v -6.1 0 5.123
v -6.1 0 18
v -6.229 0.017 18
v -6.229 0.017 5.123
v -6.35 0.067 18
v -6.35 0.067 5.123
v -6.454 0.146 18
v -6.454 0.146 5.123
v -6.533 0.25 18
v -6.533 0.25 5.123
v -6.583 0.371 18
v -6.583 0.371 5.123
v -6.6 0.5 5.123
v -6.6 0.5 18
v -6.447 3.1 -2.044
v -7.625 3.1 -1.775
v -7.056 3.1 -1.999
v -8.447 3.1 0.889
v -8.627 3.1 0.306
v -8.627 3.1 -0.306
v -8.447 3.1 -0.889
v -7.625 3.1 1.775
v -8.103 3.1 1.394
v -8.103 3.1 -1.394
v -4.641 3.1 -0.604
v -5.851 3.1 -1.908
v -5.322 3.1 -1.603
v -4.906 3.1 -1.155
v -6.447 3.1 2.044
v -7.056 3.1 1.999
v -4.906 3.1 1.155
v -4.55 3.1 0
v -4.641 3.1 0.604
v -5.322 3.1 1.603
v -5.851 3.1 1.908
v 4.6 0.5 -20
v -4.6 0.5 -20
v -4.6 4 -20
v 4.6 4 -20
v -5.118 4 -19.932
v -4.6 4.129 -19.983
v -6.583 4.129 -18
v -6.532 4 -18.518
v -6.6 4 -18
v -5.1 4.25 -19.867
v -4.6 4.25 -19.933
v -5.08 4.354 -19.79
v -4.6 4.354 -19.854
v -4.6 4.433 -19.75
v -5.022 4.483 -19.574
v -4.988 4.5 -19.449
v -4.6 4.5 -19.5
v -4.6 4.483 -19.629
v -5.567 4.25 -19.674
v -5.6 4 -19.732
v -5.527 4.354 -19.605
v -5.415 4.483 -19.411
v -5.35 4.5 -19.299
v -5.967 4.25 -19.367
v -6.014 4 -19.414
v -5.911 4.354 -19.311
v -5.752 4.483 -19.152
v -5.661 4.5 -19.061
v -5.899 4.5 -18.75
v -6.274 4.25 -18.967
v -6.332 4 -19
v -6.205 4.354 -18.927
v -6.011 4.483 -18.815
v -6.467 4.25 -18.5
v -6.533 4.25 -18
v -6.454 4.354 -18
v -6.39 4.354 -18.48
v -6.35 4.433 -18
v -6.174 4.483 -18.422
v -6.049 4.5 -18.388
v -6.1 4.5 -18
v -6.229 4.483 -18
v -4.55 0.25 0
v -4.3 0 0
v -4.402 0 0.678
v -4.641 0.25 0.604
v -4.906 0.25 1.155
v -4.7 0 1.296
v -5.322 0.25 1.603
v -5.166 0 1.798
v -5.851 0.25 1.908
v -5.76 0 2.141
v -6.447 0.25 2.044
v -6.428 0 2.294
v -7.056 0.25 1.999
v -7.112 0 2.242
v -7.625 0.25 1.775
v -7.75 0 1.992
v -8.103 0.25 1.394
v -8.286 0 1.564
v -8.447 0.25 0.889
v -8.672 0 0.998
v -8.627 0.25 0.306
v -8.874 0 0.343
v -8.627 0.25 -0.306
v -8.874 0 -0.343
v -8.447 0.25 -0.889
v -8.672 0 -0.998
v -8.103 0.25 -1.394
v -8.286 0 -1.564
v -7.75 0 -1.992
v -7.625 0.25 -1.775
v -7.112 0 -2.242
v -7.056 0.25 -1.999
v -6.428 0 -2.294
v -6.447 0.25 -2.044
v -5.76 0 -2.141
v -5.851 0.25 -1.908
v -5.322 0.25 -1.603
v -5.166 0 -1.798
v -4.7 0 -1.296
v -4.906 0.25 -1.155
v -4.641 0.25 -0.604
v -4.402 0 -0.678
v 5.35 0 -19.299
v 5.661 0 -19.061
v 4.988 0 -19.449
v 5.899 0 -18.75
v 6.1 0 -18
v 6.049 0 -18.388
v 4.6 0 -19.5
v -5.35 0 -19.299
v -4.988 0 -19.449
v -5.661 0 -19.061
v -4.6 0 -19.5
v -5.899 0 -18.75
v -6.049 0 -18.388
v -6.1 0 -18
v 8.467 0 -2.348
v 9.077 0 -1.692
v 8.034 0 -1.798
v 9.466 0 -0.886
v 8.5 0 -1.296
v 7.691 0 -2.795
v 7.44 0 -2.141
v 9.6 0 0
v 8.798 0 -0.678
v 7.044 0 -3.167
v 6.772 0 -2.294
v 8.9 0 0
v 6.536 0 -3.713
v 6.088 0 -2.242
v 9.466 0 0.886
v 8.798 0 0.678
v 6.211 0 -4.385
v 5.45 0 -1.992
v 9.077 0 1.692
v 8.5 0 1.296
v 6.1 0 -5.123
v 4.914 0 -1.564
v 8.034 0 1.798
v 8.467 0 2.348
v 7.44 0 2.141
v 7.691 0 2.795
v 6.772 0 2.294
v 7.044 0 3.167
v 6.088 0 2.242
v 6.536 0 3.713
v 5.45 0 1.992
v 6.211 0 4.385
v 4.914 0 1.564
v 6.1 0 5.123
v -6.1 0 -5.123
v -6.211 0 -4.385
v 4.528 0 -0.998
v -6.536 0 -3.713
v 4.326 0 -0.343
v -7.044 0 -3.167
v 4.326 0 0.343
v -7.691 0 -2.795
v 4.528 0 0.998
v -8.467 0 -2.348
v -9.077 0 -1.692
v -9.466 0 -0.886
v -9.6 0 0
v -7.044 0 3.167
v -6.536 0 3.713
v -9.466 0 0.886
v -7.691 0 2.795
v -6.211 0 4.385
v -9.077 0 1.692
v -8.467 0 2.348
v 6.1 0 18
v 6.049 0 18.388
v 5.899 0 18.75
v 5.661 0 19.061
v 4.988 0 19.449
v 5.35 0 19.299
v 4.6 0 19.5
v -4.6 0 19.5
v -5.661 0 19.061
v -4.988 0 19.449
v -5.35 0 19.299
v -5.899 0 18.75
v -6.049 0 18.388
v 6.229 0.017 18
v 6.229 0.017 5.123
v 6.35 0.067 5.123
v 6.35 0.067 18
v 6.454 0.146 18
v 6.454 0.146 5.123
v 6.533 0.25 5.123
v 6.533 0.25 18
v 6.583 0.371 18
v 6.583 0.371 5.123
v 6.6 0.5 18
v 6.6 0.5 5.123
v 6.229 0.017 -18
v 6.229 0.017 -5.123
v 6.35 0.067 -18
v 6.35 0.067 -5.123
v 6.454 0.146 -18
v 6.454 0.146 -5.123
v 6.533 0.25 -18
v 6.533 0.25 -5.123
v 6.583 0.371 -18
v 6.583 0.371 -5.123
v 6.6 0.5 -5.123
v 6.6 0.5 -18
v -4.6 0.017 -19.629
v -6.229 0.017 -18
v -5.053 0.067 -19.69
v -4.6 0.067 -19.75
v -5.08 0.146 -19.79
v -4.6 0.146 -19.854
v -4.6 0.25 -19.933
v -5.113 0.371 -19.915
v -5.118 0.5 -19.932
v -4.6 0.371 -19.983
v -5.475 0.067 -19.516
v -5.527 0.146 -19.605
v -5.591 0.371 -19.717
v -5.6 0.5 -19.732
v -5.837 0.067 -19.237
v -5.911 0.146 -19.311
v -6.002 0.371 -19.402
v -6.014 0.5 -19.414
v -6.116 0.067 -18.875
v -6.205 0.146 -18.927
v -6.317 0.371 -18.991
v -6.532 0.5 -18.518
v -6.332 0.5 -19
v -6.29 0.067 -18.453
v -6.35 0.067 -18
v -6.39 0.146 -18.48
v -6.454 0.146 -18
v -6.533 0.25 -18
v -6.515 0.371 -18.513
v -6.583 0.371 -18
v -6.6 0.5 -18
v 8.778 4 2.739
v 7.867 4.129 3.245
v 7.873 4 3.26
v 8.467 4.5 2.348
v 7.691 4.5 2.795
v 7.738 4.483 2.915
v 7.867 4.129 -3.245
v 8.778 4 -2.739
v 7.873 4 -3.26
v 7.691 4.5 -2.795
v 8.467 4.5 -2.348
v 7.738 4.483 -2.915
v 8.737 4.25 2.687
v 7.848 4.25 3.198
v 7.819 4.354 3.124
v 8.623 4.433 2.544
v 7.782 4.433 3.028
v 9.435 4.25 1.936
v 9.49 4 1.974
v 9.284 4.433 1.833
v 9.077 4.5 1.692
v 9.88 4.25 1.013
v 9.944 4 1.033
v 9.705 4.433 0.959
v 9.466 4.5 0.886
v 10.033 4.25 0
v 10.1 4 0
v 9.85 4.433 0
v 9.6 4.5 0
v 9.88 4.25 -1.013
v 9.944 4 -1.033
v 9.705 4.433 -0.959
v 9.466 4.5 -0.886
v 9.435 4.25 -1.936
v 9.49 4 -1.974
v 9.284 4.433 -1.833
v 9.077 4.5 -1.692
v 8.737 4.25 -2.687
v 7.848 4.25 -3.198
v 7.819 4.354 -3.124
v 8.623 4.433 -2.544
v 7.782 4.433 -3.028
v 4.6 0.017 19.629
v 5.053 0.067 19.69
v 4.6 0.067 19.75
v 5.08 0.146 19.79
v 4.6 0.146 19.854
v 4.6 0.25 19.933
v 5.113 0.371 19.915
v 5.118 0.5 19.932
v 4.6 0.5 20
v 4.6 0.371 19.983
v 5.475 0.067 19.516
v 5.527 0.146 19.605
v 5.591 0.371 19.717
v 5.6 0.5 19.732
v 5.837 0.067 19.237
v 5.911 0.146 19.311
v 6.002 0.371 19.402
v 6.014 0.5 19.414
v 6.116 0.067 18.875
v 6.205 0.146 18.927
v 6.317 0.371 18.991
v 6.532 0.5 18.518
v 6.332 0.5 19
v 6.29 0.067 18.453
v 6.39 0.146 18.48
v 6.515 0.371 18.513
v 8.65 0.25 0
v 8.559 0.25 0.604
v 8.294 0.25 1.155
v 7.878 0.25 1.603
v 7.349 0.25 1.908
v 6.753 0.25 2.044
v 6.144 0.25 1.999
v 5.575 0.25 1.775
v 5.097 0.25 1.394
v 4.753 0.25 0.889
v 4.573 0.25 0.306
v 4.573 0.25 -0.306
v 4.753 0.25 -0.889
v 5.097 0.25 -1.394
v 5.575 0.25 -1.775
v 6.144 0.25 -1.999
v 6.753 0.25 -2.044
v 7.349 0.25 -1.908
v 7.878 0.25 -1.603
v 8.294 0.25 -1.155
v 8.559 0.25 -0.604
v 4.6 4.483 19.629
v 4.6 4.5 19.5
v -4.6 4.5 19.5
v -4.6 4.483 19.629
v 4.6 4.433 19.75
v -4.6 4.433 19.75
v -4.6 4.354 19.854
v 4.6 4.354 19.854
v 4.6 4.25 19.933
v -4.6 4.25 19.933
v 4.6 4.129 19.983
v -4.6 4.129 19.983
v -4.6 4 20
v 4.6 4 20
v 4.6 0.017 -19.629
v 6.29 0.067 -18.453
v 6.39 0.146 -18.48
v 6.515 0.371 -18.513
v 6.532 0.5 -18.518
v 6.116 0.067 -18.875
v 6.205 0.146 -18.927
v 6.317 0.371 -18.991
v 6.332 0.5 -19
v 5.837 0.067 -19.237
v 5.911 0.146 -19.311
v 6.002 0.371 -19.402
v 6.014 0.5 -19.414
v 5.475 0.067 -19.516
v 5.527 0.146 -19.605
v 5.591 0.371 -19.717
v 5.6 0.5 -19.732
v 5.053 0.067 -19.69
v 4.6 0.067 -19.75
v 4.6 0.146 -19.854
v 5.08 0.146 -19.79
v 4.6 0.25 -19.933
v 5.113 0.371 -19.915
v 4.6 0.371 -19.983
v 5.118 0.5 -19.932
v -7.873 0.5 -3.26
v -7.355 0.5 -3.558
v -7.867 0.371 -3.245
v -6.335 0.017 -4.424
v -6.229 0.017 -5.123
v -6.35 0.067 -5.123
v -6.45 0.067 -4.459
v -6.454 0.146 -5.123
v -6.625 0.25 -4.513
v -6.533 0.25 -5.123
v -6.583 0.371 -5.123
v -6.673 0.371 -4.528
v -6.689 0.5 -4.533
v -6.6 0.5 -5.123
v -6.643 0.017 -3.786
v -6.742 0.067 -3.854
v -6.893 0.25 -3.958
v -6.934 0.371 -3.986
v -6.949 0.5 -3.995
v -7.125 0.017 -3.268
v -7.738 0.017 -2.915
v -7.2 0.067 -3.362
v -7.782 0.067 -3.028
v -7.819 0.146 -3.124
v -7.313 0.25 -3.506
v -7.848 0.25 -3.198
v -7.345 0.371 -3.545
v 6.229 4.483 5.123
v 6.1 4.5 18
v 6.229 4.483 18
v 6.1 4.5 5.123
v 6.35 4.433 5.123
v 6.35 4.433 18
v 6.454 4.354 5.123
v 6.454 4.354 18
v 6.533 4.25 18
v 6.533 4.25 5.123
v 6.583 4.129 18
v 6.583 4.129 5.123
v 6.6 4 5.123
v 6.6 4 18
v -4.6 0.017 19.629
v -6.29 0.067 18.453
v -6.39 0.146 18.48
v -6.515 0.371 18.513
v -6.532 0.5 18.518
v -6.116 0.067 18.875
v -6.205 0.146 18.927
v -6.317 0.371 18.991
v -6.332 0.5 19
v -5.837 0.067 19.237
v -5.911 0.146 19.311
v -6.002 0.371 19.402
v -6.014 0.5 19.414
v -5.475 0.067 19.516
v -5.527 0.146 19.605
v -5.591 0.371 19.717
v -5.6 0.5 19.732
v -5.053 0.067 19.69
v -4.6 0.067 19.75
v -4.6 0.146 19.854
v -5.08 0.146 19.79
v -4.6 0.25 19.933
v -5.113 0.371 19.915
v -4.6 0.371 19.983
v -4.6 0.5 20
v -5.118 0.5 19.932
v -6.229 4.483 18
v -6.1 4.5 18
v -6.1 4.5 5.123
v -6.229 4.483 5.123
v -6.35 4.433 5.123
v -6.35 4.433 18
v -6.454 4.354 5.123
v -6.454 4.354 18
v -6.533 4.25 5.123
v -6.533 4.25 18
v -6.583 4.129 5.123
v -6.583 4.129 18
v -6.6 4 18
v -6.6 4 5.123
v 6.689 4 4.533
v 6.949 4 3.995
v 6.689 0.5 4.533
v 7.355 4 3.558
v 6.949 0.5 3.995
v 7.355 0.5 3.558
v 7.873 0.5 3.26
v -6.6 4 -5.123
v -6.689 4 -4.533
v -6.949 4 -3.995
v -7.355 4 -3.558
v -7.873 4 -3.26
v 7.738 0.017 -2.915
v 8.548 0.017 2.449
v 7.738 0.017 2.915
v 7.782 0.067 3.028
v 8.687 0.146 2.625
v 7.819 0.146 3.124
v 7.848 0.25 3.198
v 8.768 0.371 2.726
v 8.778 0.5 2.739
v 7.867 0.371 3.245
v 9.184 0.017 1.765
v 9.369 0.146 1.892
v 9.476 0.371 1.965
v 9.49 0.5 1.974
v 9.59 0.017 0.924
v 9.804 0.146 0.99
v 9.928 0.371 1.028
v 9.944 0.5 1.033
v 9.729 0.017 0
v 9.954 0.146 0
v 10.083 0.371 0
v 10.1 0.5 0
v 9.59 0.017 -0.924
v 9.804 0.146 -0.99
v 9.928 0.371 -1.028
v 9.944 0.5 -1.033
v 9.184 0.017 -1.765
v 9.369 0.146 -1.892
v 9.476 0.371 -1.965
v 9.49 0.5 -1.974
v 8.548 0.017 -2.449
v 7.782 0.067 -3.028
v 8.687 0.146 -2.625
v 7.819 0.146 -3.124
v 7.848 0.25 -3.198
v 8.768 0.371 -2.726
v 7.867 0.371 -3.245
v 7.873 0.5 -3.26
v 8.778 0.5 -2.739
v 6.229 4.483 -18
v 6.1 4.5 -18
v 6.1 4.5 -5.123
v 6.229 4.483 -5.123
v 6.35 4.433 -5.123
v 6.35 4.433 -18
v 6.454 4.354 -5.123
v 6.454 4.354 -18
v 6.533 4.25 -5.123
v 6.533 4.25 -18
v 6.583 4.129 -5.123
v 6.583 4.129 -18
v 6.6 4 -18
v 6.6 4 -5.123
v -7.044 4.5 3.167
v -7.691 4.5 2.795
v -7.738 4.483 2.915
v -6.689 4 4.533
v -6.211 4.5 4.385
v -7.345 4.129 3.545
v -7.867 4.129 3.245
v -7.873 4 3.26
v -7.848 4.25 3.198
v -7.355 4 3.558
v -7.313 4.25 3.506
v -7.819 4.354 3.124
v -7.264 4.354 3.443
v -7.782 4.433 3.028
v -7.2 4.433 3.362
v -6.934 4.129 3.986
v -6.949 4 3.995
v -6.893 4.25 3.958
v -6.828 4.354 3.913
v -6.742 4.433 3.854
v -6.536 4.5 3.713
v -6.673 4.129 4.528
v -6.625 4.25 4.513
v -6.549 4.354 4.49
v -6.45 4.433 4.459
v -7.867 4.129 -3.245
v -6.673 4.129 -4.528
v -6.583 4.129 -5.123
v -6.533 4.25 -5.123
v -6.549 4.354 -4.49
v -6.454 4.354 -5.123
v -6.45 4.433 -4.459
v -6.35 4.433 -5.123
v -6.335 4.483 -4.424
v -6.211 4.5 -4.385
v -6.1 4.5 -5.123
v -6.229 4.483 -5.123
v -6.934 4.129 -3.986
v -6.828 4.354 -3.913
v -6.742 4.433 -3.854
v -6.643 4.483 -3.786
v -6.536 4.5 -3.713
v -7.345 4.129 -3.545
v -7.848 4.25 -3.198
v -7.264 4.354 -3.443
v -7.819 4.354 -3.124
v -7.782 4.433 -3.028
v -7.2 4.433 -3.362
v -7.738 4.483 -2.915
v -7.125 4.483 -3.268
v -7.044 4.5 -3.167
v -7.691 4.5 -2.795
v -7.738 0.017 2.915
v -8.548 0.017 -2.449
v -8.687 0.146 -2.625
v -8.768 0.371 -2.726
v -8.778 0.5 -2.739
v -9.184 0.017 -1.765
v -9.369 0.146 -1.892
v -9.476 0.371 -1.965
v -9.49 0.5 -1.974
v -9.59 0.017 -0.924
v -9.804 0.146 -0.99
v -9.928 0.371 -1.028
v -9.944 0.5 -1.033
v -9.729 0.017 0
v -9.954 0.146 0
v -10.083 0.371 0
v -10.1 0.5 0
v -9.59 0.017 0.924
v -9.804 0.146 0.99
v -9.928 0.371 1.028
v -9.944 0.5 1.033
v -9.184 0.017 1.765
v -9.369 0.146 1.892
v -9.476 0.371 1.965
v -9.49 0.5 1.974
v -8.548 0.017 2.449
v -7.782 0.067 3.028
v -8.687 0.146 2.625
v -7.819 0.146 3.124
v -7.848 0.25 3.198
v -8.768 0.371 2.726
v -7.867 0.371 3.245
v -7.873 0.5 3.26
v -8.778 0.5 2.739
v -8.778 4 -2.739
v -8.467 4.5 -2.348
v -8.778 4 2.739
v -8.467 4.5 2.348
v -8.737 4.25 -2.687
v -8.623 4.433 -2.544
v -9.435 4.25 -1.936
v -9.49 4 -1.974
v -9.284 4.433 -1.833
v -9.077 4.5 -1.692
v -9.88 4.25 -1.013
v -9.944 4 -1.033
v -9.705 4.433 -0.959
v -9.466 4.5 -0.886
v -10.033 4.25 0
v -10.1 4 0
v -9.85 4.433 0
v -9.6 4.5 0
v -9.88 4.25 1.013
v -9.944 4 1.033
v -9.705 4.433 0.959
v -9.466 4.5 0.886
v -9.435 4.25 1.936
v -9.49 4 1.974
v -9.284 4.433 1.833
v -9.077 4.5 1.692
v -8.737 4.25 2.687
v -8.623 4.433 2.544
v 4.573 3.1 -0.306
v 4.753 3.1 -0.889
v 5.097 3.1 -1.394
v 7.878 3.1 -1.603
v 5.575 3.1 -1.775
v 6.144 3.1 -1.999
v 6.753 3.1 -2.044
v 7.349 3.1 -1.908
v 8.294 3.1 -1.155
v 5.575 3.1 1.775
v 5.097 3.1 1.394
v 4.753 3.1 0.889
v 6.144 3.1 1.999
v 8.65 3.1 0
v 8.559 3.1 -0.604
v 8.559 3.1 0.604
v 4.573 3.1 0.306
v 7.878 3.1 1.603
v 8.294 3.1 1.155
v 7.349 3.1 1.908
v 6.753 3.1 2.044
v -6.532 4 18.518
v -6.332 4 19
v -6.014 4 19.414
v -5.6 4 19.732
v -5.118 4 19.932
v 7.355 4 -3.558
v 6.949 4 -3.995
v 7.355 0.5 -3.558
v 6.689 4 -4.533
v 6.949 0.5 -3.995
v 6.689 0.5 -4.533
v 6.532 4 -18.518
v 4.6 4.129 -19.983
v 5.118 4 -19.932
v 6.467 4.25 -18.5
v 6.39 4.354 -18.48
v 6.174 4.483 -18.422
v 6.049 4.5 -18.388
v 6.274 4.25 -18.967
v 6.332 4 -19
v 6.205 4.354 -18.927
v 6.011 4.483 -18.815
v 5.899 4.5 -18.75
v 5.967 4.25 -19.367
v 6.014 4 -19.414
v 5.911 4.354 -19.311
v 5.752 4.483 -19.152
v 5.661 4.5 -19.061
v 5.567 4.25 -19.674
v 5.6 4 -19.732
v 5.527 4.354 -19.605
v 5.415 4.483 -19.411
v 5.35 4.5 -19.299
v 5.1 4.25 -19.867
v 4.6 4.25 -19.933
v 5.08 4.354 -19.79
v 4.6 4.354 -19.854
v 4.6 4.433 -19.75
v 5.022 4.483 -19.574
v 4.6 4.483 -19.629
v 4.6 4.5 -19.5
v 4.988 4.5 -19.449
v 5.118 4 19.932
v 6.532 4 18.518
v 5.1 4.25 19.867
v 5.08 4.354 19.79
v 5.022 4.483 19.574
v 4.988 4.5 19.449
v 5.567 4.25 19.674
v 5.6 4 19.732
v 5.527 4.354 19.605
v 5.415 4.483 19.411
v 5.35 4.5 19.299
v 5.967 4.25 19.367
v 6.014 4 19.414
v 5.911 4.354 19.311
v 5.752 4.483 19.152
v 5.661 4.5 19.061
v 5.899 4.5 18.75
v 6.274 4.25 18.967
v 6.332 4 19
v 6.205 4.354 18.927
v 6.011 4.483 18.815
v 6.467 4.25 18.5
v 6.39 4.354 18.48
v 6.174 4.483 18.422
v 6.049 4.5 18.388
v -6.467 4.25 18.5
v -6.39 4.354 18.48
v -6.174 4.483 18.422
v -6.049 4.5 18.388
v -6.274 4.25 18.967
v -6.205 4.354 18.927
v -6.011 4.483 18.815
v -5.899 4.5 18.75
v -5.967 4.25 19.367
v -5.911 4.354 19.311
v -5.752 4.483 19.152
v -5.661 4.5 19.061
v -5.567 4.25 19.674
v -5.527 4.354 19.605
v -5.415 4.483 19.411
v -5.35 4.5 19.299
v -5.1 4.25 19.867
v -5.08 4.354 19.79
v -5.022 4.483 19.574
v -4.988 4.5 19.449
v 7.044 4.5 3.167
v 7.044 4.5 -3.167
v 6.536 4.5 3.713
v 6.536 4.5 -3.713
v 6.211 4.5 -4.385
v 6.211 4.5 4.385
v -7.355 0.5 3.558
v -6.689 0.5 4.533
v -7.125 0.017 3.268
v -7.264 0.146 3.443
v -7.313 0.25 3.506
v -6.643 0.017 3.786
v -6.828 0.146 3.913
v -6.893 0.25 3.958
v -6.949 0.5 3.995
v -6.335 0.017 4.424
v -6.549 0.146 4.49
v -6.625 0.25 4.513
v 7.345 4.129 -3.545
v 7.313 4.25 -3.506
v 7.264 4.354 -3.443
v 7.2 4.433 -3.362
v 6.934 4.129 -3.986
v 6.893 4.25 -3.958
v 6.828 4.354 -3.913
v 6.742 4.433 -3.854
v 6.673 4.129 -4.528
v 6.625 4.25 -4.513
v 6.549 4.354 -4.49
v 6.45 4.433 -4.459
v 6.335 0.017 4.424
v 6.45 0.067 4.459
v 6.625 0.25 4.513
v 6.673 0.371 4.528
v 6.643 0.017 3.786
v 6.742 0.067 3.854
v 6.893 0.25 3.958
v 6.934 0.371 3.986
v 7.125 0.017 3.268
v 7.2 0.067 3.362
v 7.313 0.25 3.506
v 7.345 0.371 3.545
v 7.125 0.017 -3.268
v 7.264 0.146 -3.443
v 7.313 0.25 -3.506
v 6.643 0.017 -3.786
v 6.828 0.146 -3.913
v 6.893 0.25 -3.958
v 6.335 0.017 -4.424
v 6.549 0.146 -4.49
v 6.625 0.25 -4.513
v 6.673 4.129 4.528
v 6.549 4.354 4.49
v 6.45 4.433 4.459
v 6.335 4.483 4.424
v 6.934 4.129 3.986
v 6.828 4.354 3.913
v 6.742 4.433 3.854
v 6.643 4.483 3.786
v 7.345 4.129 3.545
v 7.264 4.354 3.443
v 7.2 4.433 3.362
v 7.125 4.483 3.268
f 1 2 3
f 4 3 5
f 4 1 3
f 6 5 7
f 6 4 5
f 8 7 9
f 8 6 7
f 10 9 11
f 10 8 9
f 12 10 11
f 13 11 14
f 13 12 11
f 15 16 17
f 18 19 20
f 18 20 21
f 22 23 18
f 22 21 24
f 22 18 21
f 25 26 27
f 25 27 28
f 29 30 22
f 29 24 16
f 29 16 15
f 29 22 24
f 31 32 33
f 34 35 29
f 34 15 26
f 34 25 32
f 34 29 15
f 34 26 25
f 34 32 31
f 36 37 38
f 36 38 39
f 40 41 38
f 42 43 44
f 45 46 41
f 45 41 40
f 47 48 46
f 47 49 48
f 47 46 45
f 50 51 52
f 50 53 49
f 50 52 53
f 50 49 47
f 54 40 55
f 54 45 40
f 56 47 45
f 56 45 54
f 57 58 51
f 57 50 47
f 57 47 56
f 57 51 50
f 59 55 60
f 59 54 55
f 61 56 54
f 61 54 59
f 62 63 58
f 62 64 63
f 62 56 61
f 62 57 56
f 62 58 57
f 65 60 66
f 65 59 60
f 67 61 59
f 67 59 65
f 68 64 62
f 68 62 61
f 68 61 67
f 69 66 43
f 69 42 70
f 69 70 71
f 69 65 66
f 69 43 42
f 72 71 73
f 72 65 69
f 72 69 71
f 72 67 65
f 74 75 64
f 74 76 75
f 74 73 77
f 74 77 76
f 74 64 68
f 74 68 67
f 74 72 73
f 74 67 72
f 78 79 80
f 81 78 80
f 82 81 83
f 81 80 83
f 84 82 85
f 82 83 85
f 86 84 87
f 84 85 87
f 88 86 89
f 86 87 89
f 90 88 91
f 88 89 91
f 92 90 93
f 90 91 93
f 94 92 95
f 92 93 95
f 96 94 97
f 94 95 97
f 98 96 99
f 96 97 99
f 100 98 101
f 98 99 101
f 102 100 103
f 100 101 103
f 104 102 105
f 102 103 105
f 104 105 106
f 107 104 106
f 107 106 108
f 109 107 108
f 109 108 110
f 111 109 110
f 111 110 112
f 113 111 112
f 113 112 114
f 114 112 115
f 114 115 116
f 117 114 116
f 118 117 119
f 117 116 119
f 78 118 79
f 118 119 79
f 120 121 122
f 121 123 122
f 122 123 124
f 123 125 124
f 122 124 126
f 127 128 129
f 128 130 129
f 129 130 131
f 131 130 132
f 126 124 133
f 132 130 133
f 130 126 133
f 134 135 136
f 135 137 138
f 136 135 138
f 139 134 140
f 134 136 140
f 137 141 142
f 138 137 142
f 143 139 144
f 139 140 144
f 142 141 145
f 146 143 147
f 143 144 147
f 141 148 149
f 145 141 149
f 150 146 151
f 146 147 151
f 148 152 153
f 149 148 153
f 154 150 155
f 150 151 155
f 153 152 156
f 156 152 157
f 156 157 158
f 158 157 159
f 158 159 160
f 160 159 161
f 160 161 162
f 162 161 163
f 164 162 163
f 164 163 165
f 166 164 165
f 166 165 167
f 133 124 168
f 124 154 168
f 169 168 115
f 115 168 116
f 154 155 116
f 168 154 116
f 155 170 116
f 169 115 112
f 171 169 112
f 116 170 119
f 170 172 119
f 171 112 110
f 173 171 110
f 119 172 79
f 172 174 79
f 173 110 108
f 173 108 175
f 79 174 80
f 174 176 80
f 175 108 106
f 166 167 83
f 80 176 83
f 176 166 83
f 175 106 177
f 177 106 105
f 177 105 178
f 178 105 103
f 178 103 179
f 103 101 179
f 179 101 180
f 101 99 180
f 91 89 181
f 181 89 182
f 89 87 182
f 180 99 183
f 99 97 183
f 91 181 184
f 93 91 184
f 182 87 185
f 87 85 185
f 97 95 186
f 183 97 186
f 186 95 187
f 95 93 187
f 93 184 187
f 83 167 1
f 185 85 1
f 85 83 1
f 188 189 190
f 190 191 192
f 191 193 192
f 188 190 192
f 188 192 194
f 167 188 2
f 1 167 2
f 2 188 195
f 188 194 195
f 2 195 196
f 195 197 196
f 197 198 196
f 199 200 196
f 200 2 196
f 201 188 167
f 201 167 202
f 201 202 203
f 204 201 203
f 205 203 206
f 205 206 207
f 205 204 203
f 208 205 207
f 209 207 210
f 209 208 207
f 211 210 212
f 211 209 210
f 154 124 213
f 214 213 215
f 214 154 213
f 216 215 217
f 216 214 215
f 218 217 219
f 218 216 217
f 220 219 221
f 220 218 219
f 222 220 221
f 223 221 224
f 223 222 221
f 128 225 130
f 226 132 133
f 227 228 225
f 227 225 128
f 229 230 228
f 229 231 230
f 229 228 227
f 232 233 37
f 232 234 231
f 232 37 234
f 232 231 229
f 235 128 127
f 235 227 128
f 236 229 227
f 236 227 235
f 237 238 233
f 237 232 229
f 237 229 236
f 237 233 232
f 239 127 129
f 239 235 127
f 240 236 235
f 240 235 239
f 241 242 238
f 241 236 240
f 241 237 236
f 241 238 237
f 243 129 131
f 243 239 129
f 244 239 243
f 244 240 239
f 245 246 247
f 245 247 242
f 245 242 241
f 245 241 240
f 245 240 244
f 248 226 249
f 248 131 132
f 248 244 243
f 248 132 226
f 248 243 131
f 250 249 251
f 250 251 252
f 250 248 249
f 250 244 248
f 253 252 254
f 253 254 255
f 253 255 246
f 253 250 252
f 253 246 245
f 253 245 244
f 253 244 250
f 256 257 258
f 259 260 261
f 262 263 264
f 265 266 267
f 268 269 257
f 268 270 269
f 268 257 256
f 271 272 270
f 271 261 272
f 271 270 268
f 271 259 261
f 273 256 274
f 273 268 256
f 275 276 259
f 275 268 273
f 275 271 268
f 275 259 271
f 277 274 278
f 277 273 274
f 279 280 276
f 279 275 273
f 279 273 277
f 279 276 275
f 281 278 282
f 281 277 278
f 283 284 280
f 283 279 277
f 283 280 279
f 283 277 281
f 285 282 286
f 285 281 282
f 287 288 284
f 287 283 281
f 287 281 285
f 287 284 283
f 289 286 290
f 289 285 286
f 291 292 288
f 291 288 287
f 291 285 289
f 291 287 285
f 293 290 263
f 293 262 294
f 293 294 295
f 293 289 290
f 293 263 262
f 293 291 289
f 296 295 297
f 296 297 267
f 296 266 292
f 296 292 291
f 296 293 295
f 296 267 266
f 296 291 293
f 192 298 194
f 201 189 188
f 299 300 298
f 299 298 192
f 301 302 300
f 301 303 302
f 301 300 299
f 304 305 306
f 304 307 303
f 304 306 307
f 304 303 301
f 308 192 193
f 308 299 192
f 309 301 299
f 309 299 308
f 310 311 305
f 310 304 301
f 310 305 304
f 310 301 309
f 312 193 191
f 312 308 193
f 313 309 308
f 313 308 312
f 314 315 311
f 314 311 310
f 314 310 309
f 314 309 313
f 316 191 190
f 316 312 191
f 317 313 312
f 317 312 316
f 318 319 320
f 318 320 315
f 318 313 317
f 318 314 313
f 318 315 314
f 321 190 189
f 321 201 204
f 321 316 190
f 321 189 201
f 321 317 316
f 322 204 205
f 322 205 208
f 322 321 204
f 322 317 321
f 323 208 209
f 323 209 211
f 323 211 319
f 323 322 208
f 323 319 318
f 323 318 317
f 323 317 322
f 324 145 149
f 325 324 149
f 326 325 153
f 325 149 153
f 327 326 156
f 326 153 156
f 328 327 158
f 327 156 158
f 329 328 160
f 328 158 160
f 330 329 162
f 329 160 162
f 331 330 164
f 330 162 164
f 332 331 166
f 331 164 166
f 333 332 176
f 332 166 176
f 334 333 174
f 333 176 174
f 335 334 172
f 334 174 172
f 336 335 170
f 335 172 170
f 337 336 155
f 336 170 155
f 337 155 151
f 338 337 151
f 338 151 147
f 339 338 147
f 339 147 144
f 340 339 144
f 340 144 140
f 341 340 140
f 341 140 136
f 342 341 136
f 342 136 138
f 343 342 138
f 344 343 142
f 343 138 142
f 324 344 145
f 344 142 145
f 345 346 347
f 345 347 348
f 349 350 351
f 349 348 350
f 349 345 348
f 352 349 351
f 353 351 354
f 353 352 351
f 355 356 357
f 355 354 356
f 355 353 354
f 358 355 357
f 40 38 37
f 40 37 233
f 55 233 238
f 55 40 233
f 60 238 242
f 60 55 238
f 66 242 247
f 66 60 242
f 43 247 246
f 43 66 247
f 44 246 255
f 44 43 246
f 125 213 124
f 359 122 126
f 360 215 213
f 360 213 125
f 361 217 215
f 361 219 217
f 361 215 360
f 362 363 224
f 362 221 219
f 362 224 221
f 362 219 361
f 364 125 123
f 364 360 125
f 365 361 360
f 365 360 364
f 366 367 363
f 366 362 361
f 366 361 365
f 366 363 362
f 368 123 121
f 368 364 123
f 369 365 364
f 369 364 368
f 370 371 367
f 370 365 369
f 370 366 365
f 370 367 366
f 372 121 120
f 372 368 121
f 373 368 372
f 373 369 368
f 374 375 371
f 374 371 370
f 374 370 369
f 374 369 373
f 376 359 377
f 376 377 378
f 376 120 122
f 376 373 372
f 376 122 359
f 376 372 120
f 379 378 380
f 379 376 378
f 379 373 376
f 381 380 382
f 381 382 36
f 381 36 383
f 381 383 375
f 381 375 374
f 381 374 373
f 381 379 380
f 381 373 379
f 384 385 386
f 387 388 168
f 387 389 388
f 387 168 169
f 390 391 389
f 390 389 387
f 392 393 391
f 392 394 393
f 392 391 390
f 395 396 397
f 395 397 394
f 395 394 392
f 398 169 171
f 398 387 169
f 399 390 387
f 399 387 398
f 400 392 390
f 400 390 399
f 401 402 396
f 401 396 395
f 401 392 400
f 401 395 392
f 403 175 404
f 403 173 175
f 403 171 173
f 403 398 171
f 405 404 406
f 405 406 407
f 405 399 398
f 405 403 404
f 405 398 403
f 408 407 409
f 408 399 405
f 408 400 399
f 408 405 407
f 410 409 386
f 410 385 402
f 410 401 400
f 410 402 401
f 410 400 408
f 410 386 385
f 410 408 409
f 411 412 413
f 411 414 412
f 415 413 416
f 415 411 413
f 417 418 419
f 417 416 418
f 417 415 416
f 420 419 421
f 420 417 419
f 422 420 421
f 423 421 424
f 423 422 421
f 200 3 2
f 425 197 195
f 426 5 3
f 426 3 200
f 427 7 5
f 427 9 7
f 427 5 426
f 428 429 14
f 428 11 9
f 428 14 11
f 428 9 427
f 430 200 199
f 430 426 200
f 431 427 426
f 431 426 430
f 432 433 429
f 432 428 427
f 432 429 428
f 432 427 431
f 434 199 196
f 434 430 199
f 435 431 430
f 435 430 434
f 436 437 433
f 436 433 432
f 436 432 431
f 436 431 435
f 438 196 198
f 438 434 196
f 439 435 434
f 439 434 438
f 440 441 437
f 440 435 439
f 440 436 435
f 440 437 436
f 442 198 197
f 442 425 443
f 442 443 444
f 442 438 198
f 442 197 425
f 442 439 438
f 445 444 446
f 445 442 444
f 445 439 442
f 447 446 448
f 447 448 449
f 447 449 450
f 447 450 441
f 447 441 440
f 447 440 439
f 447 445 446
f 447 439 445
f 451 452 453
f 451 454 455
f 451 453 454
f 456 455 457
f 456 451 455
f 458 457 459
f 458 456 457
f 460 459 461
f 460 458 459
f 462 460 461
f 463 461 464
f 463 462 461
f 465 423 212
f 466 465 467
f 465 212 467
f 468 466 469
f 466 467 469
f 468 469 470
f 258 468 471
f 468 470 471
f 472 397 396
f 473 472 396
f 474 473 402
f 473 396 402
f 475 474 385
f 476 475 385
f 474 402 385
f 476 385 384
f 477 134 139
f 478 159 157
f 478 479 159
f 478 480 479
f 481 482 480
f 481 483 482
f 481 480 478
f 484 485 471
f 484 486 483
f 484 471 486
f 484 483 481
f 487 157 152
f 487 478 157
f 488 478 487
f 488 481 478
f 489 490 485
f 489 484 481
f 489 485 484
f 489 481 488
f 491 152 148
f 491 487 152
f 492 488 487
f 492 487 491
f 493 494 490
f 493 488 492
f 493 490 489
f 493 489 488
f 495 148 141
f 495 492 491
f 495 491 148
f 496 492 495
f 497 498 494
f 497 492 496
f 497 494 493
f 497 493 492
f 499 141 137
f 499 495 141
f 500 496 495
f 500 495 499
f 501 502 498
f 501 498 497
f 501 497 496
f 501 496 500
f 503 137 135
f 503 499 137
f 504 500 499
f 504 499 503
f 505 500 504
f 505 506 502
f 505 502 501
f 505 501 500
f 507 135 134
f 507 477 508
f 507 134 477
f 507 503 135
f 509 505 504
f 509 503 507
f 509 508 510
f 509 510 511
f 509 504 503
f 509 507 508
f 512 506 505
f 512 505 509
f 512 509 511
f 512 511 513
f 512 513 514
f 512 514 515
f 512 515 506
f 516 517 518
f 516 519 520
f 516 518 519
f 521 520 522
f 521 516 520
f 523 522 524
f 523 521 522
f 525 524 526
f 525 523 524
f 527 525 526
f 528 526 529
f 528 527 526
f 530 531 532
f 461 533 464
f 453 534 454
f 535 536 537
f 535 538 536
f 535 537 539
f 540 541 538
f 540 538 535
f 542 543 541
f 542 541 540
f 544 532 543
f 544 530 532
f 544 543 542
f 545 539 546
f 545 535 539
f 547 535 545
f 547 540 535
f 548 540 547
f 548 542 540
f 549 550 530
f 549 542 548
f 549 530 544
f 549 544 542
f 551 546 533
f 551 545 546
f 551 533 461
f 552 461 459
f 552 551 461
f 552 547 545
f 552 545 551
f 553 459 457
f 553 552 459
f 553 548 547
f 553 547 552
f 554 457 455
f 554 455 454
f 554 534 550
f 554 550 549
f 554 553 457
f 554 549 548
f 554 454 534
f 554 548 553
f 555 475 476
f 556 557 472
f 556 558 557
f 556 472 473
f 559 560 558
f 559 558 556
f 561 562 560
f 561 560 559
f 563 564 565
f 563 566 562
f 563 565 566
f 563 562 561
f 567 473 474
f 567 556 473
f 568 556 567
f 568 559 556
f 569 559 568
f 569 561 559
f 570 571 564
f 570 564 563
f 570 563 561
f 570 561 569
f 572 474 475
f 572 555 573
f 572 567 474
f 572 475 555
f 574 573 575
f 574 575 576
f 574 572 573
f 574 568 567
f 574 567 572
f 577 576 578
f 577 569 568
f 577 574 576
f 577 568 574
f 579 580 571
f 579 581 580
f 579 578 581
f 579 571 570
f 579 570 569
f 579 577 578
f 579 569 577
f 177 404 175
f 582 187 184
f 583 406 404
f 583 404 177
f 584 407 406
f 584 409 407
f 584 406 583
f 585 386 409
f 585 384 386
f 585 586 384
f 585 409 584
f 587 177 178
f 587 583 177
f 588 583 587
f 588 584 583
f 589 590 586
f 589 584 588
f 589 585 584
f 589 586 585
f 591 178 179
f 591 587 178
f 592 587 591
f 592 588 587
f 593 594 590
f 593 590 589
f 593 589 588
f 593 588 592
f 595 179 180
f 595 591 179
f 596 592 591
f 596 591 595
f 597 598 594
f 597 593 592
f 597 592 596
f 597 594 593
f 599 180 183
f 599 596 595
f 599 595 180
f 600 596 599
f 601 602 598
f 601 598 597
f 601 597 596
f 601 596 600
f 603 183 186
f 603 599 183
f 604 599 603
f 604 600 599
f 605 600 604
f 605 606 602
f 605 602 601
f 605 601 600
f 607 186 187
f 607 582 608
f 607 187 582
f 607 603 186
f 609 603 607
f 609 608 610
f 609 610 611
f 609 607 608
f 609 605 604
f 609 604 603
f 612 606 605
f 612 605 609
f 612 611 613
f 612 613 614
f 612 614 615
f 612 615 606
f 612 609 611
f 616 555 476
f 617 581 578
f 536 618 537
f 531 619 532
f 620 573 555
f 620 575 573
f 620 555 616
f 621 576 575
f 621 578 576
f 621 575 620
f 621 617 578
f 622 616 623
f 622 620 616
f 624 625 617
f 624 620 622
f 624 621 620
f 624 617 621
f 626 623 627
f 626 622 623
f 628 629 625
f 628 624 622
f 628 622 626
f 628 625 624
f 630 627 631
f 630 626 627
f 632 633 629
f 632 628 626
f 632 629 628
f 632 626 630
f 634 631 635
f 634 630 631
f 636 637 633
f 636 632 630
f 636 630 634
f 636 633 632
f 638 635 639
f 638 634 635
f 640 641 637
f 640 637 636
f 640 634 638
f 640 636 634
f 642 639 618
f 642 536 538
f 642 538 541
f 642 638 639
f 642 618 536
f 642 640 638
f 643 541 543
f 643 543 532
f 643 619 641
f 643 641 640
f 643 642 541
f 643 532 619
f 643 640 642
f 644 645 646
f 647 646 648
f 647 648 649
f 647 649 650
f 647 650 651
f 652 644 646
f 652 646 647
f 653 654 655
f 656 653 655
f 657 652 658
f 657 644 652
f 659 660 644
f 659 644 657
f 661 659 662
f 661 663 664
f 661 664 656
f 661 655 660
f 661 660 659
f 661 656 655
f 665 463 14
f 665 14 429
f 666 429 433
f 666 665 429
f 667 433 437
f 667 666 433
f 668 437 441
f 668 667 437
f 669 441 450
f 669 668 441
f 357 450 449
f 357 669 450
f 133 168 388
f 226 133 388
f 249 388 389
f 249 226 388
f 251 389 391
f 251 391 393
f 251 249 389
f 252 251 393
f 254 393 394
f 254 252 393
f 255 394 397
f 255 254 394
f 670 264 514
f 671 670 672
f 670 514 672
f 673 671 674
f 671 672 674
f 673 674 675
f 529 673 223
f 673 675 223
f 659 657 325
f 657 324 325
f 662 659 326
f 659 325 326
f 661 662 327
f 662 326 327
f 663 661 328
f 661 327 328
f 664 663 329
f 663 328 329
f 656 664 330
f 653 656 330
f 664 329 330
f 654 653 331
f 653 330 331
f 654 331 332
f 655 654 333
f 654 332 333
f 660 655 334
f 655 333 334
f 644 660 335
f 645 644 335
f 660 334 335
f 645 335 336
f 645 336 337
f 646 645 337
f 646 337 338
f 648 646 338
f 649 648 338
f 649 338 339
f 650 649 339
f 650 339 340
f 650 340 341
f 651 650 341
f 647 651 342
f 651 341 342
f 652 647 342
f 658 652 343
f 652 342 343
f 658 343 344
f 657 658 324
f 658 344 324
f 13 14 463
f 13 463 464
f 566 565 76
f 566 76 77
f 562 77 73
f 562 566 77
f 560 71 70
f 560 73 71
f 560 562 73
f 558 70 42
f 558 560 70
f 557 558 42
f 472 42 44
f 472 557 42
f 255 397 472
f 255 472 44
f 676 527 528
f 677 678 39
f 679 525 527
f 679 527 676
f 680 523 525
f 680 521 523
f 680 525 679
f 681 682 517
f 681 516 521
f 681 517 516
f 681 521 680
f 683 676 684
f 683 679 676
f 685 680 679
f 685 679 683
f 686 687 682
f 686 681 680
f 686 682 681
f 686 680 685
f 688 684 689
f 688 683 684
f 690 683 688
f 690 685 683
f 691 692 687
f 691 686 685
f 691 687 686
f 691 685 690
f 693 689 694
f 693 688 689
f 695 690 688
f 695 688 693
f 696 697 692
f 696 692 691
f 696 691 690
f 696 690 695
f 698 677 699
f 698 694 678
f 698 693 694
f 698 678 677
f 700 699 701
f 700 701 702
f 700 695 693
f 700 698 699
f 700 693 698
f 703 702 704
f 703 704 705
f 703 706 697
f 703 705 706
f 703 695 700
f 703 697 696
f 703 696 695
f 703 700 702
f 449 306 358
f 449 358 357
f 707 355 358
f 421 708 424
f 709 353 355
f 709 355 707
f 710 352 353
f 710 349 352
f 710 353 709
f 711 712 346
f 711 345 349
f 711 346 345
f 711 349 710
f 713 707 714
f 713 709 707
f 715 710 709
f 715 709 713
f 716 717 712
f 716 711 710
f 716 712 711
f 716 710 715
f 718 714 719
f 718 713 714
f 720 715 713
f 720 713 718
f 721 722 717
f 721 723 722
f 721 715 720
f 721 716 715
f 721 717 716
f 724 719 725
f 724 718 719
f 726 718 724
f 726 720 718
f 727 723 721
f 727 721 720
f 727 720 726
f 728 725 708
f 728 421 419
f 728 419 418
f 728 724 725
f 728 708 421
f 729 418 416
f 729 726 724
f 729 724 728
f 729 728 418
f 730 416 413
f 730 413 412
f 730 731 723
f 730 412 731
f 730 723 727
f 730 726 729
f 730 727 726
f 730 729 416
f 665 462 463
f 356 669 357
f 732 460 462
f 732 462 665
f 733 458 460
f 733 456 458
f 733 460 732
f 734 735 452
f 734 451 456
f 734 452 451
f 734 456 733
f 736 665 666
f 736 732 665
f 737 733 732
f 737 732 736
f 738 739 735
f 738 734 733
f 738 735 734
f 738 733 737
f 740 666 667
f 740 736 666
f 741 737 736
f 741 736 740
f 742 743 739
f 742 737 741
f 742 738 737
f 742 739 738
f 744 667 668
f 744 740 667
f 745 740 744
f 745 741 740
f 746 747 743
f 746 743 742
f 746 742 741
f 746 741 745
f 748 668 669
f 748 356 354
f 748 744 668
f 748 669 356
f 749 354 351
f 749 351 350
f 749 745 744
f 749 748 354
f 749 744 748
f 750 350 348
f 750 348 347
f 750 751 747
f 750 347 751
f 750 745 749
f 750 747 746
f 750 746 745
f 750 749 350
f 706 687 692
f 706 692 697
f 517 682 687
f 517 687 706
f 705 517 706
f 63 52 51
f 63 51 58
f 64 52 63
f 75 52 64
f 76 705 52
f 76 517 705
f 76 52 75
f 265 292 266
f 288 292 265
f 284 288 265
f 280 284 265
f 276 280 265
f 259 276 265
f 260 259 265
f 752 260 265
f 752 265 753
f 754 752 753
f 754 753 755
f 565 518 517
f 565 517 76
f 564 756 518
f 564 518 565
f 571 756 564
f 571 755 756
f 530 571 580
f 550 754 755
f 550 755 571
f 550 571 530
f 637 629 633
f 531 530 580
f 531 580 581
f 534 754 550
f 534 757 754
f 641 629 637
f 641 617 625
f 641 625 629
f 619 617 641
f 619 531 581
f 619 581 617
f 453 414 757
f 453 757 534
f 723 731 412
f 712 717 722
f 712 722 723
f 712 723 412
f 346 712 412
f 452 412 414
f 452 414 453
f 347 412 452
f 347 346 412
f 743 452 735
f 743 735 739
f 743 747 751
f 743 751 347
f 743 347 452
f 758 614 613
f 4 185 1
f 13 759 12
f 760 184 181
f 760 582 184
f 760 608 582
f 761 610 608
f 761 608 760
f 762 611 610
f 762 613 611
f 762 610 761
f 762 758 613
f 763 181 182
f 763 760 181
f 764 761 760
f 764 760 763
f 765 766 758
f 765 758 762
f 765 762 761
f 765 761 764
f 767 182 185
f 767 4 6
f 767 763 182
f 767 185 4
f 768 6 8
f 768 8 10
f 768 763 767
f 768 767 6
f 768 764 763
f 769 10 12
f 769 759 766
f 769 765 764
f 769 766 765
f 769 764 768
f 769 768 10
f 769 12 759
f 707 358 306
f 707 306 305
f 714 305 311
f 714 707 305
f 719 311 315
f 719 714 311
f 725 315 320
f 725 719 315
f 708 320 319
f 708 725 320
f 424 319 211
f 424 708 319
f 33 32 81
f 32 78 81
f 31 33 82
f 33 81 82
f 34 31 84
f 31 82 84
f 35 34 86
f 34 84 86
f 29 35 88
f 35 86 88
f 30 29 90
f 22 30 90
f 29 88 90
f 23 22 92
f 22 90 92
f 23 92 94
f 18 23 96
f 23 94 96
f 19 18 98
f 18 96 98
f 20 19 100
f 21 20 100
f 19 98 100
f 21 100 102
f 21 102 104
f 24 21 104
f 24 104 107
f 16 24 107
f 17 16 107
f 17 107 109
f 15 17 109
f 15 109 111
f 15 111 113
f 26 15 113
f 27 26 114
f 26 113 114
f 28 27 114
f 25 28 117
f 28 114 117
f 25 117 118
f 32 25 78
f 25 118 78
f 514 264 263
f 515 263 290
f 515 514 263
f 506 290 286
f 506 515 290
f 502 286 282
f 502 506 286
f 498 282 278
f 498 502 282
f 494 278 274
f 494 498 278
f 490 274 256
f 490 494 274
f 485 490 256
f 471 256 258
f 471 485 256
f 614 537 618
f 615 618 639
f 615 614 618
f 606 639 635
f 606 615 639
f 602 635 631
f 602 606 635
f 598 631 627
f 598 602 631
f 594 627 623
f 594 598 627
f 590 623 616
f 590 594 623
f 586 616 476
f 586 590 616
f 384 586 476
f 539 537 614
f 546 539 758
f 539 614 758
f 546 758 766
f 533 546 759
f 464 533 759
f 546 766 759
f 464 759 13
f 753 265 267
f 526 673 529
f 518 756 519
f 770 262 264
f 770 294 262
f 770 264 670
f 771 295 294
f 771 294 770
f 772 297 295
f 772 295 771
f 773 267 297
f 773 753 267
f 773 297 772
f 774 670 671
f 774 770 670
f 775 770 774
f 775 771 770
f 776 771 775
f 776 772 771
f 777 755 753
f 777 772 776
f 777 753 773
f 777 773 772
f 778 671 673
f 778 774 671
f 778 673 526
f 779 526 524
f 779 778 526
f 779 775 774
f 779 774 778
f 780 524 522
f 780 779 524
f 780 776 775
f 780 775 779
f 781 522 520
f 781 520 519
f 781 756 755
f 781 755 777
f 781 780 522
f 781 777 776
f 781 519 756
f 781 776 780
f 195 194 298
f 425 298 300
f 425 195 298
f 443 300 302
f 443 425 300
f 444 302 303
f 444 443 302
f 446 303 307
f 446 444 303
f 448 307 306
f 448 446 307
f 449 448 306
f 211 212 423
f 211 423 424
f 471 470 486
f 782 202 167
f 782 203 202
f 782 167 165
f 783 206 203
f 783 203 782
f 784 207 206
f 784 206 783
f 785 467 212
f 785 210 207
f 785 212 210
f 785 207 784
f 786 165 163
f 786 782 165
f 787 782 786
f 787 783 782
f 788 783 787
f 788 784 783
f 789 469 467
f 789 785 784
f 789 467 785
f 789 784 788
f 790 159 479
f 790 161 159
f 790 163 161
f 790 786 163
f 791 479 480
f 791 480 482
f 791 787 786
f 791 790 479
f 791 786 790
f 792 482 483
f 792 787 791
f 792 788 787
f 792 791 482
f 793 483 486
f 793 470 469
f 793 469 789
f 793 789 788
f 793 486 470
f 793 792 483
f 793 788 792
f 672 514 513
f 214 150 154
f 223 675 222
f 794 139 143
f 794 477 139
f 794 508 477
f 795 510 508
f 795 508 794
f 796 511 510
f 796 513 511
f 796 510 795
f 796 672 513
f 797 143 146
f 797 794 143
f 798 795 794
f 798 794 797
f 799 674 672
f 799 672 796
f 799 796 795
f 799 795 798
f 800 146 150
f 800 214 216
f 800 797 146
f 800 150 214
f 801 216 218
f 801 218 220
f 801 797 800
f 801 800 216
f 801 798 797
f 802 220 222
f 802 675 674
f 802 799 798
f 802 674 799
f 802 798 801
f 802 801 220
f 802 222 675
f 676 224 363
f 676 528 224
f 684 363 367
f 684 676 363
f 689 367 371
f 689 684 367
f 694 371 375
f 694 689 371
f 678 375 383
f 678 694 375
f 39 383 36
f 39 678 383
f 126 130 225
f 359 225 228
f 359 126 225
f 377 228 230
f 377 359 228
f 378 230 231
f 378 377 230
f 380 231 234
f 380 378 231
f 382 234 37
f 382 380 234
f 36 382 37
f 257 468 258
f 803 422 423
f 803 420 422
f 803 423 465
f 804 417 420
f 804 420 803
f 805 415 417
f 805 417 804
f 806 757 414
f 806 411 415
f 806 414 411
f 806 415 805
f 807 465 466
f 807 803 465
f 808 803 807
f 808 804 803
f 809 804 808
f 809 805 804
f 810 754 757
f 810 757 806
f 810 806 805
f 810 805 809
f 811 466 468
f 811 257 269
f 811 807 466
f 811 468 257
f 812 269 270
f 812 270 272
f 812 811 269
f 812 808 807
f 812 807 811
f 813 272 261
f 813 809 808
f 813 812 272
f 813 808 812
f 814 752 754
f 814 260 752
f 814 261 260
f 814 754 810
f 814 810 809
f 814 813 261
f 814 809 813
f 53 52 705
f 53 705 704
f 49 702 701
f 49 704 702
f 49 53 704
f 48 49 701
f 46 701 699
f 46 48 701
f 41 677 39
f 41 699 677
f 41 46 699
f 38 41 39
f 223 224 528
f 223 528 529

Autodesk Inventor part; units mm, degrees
ref_plane "YZ Plane" through (0, 0, 0) normal (1, 0, 0) x (0, 1, 0)
ref_plane "XZ Plane" through (0, 0, 0) normal (0, 1, 0) x (-1, 0, 0)
ref_plane "XY Plane" through (0, 0, 0) normal (0, 0, 1) x (1, 0, 0)
sketch "Sketch1" plane through (0, 0, 0) normal (0, 1, 0) x (-1, 0, 0)
  line L0 (6.6, -20) -> (-6.6, -20)
  line L1 (-6.6, -20) -> (-6.6, 20)
  line L2 (-6.6, 20) -> (6.6, 20)
  line L3 (6.6, 20) -> (6.6, -20)
  point P0 (0, 0)
  point P1 (0, -20)
  point P2 (-6.6, 0)
  dimension "d0" = 13.2
  dimension "d1" = 40
extrude "Extrusion1" add sketch "Sketch1" along normal blind 4.5
sketch "Sketch2" plane through (0, 0, 0) normal (0, -1, 0) x (1, 0, 0)
  line L0 (6.6, 20) -> (6.6, -20) projected
  circle A0 centre (6.6, 0) radius 2.05
  line L1 (-6.6, -20) -> (-6.6, 20) projected
  circle A1 centre (-6.6, 0) radius 2.05
  circle A2 centre (6.6, 0) radius 3.5
  circle A3 centre (-6.6, 0) radius 3.5
  point P0 (0, 0)
  dimension "d4" = 4.1
  dimension "d5" = 7
extrude "Extrusion2" add sketch "Sketch2" against normal blind 4.5
extrude "Extrusion3" cut sketch "Sketch2" against normal blind 3.1 contours A0 L0 | L0 A0 | A1 L1 | L1 A1
fillet "Fillet1" radius 2 8 edges at (6.6, 2.25, -20) (-6.6, 2.25, -20) (6.6, 2.25, 20) (-6.6, 2.25, 20) (6.6, 2.25, -3.5) (6.6, 2.25, 3.5) (-6.6, 2.25, -3.5) (-6.6, 2.25, 3.5)
fillet "Fillet2" radius 0.5 24 edges at (-6.6, 0, -11.5617) (-6.0142, 0, -19.4142) (0, 0, -20) (6.0142, 0, -19.4142) (6.6, 0, -11.5617) (10.1, 0, 0) (6.0142, 0, 19.4142) (6.6, 0, 11.5617) (0, 0, 20) (-6.0142, 0, 19.4142) (-6.6, 0, 11.5617) (-10.1, 0, 0) (-6.0142, 4.5, -19.4142) (-6.0142, 4.5, 19.4142) (-6.6, 4.5, 11.5617) (0, 4.5, 20) (6.0142, 4.5, 19.4142) (6.6, 4.5, 11.5617) (6.0142, 4.5, -19.4142) (10.1, 4.5, 0) (6.6, 4.5, -11.5617) (0, 4.5, -20) (-6.6, 4.5, -11.5617) (-10.1, 4.5, 0)
chamfer "Chamfer1" distance 0.25 angle 45 2 edges at (-8.65, 0, 0) (4.55, 0, 0)
properties part number "FuselageLock"
